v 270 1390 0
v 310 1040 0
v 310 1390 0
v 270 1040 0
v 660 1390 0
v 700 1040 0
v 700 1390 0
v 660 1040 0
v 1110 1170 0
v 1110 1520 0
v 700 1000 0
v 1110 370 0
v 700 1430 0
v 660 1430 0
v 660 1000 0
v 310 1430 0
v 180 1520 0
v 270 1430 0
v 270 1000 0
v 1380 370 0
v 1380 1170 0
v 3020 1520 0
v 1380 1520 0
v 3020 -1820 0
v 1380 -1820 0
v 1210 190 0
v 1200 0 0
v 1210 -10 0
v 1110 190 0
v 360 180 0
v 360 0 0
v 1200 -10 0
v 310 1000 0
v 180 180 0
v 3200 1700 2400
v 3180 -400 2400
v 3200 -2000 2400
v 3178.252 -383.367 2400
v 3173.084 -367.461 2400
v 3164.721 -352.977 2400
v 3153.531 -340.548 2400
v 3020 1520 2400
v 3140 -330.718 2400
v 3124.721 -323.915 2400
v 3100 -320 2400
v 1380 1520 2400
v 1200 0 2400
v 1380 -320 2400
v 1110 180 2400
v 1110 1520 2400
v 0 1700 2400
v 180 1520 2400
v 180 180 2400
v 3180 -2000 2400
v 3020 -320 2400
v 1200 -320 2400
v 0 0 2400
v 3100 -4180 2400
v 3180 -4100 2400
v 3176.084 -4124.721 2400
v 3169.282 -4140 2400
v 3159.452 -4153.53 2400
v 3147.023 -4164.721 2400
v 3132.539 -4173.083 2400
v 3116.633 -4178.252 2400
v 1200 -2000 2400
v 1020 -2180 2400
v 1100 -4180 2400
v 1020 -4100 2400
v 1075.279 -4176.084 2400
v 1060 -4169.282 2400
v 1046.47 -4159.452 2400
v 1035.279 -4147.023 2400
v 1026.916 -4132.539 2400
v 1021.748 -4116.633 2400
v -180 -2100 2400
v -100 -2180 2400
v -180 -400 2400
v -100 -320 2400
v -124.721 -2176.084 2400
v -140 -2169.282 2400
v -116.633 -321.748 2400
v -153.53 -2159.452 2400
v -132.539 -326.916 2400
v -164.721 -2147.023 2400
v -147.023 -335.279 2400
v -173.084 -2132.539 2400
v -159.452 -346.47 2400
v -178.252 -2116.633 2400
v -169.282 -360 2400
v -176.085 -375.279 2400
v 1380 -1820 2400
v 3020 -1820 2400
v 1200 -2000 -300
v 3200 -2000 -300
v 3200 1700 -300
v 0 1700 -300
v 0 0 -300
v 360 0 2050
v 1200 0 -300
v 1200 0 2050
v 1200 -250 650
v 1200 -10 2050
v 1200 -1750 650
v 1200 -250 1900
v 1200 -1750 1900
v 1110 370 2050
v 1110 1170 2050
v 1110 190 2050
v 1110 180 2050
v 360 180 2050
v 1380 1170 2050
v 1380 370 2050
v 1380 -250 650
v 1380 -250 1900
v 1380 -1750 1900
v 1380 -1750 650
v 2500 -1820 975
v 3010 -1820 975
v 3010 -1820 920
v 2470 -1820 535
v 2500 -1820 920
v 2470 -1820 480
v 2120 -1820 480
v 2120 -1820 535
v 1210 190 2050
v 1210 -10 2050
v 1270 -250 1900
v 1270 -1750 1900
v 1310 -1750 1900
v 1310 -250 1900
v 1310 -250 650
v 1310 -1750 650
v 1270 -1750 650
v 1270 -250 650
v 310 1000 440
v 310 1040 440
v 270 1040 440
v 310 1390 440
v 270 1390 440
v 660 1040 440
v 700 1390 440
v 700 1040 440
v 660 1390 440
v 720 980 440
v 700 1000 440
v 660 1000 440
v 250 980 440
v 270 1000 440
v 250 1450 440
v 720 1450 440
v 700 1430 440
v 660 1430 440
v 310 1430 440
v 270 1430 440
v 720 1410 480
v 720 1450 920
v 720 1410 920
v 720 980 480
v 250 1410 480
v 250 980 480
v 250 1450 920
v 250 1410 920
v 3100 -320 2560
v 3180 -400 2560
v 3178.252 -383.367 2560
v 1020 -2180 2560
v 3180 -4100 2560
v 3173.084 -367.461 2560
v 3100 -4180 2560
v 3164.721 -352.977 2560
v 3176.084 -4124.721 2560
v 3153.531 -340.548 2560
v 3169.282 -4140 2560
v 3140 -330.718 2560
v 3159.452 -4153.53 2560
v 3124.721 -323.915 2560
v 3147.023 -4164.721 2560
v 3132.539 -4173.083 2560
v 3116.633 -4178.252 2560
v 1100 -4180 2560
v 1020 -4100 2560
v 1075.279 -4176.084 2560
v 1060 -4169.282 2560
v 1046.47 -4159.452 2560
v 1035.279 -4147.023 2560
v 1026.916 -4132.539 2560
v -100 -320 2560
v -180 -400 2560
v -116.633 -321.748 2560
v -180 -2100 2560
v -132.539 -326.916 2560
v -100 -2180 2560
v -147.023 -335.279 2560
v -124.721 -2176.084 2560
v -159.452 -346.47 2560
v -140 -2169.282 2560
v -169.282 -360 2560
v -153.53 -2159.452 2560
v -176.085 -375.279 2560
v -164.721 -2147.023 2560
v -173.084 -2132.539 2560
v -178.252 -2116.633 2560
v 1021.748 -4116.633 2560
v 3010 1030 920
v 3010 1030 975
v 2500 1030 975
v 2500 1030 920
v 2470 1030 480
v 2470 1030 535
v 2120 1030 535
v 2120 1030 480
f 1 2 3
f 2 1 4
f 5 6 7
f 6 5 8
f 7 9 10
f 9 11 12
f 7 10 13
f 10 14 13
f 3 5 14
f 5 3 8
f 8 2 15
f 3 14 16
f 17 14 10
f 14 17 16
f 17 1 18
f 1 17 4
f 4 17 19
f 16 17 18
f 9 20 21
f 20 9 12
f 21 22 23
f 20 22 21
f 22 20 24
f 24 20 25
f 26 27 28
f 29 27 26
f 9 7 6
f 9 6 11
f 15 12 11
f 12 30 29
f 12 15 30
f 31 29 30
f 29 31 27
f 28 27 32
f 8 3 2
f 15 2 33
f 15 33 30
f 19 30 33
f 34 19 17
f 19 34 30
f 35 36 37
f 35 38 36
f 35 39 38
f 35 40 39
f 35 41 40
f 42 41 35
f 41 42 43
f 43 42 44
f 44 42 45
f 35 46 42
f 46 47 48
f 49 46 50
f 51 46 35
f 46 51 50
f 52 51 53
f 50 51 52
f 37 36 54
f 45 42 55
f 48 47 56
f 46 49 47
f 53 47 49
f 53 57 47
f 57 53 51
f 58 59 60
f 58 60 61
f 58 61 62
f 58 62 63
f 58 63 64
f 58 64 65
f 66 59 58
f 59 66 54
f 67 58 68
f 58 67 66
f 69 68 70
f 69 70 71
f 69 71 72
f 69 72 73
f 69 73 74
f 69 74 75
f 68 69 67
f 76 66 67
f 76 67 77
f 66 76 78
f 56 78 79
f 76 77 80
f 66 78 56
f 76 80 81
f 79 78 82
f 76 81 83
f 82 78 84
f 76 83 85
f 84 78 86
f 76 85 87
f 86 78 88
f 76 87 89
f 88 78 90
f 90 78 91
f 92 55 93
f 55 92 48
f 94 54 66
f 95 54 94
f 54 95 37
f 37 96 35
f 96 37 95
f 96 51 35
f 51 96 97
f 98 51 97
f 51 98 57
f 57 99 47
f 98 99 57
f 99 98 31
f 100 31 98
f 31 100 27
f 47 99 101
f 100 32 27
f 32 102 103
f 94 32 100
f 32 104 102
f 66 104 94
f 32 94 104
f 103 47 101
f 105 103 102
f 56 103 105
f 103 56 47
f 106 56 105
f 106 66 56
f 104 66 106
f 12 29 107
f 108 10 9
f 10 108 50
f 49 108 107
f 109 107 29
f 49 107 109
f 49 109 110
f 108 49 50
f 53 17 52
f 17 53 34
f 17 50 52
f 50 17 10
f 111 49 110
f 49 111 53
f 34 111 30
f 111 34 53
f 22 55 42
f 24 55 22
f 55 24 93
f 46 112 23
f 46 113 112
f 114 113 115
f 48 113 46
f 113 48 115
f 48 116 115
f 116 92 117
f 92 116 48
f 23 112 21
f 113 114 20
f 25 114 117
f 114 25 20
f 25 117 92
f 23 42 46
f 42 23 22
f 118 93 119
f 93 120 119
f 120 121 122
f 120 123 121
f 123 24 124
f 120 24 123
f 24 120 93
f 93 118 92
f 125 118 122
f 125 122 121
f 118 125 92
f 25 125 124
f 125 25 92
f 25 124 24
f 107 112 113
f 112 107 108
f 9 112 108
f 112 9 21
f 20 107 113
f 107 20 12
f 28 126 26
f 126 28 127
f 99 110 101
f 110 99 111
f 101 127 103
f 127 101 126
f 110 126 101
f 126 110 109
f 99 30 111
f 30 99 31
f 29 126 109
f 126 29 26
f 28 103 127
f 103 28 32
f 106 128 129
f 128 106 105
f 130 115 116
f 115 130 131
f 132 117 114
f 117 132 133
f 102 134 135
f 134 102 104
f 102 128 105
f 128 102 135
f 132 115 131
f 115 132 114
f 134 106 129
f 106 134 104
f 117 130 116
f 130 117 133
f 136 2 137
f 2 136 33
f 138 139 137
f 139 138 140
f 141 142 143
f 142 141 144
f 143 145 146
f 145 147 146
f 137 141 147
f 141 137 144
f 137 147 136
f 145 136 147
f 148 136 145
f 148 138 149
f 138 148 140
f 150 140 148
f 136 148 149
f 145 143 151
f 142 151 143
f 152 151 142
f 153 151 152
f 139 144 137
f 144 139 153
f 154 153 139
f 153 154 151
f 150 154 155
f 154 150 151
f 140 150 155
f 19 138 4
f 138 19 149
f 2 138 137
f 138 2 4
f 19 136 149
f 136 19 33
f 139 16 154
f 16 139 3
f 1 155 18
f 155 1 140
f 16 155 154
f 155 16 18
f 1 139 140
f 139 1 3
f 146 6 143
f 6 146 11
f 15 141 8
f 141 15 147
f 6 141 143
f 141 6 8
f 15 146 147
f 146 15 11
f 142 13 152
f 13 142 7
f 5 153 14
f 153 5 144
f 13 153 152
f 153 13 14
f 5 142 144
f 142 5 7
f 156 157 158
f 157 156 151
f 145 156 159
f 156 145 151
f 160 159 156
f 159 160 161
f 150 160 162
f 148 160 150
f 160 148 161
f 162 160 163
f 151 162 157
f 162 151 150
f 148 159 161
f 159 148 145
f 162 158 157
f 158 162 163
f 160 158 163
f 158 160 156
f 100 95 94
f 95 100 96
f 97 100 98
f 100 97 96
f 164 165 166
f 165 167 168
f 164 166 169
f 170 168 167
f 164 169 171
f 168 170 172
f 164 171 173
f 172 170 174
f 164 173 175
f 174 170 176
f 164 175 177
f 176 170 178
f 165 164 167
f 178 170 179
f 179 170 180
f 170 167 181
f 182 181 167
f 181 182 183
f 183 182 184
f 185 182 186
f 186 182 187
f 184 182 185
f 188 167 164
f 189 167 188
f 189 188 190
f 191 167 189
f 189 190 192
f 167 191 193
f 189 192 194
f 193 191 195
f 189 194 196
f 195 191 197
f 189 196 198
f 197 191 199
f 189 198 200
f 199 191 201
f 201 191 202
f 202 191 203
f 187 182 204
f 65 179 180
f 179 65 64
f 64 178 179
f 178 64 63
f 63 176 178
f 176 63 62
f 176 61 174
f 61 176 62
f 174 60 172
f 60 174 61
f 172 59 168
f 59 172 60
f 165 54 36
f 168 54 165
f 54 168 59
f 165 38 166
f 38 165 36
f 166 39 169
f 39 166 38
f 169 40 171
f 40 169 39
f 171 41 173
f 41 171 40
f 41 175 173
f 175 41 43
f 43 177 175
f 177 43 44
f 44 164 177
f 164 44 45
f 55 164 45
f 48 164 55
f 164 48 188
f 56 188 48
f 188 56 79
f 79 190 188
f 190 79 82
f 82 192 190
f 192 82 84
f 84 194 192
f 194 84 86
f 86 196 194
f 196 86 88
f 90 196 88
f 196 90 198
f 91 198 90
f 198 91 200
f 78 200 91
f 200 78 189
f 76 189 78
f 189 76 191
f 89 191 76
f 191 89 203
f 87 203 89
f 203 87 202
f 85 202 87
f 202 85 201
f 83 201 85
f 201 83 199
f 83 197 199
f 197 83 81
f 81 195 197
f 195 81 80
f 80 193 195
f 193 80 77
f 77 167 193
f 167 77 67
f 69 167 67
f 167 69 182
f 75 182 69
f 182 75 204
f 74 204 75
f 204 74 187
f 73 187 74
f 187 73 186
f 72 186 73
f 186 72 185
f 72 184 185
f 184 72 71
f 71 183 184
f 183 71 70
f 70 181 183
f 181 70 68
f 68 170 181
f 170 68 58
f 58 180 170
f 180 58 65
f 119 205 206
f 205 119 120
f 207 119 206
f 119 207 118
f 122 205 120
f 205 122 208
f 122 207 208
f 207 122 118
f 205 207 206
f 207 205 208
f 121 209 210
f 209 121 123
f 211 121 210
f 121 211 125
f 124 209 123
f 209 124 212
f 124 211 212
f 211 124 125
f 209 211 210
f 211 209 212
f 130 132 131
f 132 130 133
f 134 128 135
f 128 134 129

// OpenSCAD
// Gartensauna V3 – parametrisches geometrisches Konzept, Einheiten mm.
// Export: openscad -o wall.stl -D 'part="walls"' -D 'view="assembled"' sauna-v3.scad
// Wichtig: KEINE geprüfte Baukonstruktion. Öffnungen und Materialien sind Platzhalter.
main_width = 3200;
main_depth = 1700;
wing_width = 2000;       // Annahme, zu bestätigen
wing_extension = 2000;   // Nutzerangabe als zusätzlicher Schenkel interpretiert
wall = 180;              // Modellparameter, NICHT freigegebener Wandaufbau
height = 2400;           // Annahme
floor_thickness = 120;
roof_thickness = 160;
part = "all";            // ["all","foundation","floor","walls","roof","upper_bench","lower_bench","chair","glazing"]
view = "assembled";      // ["assembled","exploded"]
offset = view == "exploded" ? 420 : 0;
// Grundriss: x von 0..3200, y von -2000..1700.
// Umkleide links im Bestandsrechteck; Saunaflügel rechts.
module footprint(){
    union(){
        square([main_width, main_depth]);
        translate([main_width-wing_width,-wing_extension]) square([wing_width,wing_extension]);
    }
}
module footprint_3d(h){
    linear_extrude(height=h) footprint();
}
module foundation(){
    translate([0,0,-300-offset*2]) footprint_3d(180);
}
module floor(){
    translate([0,0,-floor_thickness-offset]) footprint_3d(floor_thickness);
}
module walls(){
    difference(){
        footprint_3d(height);
        // inset voids: room on left, and right L wing, with open connection
        translate([wall,wall,-1]) cube([main_width-wing_width-wall*1.5,main_depth-2*wall,height+2]);
        translate([main_width-wing_width+wall,-wing_extension+wall,-1])
            cube([wing_width-2*wall,wing_extension+main_depth-2*wall,height+2]);
        // passage from dressing room into sauna wing
        translate([main_width-wing_width-wall-5,370,0]) cube([wall*2+10,800,2050]);
        // outside entrance on left front (y=0)
        translate([360,-10,0]) cube([850,wall+20,2050]);
        // garden-facing glazing, left edge of projecting wing
        translate([main_width-wing_width-10,-wing_extension+250,650])
            cube([wall+20,wing_extension-500,1250]);
    }
}
module roof(){
    translate([-100,-wing_extension-100,height+offset])
        linear_extrude(height=roof_thickness)
        offset(r=80) footprint();
}
module upper_bench(){
    translate([main_width-700,-wing_extension+180,920])
        cube([510,wing_extension+850,55]);
}
module lower_bench(){
    translate([main_width-1080,-wing_extension+180,480])
        cube([350,wing_extension+850,55]);
}
module chair(){
    // Only illustrative chair: seat + backrest + legs
    translate([250,main_depth-720,0])
    union(){
        translate([0,0,440])cube([470,470,40]);
        translate([0,430,440])cube([470,40,480]);
        for(x=[20,410]) for(y=[20,410]) translate([x,y,0])cube([40,40,440]);
    }
}
module glazing(){
    // 40 mm placeholder glass, overlaps wall opening only, not a glass specification
    translate([main_width-wing_width+wall/2-20,-wing_extension+250,650])
        cube([40,wing_extension-500,1250]);
}
if(part=="all" || part=="foundation") color("gray") foundation();
if(part=="all" || part=="floor") color("burlywood") floor();
if(part=="all" || part=="walls") color("tan",0.65) walls();
if(part=="all" || part=="roof") color("dimgray") roof();
if(part=="all" || part=="upper_bench") color("wheat") upper_bench();
if(part=="all" || part=="lower_bench") color("peru") lower_bench();
if(part=="all" || part=="chair") color("saddlebrown") chair();
if(part=="all" || part=="glazing") color("lightblue",0.5) glazing();
